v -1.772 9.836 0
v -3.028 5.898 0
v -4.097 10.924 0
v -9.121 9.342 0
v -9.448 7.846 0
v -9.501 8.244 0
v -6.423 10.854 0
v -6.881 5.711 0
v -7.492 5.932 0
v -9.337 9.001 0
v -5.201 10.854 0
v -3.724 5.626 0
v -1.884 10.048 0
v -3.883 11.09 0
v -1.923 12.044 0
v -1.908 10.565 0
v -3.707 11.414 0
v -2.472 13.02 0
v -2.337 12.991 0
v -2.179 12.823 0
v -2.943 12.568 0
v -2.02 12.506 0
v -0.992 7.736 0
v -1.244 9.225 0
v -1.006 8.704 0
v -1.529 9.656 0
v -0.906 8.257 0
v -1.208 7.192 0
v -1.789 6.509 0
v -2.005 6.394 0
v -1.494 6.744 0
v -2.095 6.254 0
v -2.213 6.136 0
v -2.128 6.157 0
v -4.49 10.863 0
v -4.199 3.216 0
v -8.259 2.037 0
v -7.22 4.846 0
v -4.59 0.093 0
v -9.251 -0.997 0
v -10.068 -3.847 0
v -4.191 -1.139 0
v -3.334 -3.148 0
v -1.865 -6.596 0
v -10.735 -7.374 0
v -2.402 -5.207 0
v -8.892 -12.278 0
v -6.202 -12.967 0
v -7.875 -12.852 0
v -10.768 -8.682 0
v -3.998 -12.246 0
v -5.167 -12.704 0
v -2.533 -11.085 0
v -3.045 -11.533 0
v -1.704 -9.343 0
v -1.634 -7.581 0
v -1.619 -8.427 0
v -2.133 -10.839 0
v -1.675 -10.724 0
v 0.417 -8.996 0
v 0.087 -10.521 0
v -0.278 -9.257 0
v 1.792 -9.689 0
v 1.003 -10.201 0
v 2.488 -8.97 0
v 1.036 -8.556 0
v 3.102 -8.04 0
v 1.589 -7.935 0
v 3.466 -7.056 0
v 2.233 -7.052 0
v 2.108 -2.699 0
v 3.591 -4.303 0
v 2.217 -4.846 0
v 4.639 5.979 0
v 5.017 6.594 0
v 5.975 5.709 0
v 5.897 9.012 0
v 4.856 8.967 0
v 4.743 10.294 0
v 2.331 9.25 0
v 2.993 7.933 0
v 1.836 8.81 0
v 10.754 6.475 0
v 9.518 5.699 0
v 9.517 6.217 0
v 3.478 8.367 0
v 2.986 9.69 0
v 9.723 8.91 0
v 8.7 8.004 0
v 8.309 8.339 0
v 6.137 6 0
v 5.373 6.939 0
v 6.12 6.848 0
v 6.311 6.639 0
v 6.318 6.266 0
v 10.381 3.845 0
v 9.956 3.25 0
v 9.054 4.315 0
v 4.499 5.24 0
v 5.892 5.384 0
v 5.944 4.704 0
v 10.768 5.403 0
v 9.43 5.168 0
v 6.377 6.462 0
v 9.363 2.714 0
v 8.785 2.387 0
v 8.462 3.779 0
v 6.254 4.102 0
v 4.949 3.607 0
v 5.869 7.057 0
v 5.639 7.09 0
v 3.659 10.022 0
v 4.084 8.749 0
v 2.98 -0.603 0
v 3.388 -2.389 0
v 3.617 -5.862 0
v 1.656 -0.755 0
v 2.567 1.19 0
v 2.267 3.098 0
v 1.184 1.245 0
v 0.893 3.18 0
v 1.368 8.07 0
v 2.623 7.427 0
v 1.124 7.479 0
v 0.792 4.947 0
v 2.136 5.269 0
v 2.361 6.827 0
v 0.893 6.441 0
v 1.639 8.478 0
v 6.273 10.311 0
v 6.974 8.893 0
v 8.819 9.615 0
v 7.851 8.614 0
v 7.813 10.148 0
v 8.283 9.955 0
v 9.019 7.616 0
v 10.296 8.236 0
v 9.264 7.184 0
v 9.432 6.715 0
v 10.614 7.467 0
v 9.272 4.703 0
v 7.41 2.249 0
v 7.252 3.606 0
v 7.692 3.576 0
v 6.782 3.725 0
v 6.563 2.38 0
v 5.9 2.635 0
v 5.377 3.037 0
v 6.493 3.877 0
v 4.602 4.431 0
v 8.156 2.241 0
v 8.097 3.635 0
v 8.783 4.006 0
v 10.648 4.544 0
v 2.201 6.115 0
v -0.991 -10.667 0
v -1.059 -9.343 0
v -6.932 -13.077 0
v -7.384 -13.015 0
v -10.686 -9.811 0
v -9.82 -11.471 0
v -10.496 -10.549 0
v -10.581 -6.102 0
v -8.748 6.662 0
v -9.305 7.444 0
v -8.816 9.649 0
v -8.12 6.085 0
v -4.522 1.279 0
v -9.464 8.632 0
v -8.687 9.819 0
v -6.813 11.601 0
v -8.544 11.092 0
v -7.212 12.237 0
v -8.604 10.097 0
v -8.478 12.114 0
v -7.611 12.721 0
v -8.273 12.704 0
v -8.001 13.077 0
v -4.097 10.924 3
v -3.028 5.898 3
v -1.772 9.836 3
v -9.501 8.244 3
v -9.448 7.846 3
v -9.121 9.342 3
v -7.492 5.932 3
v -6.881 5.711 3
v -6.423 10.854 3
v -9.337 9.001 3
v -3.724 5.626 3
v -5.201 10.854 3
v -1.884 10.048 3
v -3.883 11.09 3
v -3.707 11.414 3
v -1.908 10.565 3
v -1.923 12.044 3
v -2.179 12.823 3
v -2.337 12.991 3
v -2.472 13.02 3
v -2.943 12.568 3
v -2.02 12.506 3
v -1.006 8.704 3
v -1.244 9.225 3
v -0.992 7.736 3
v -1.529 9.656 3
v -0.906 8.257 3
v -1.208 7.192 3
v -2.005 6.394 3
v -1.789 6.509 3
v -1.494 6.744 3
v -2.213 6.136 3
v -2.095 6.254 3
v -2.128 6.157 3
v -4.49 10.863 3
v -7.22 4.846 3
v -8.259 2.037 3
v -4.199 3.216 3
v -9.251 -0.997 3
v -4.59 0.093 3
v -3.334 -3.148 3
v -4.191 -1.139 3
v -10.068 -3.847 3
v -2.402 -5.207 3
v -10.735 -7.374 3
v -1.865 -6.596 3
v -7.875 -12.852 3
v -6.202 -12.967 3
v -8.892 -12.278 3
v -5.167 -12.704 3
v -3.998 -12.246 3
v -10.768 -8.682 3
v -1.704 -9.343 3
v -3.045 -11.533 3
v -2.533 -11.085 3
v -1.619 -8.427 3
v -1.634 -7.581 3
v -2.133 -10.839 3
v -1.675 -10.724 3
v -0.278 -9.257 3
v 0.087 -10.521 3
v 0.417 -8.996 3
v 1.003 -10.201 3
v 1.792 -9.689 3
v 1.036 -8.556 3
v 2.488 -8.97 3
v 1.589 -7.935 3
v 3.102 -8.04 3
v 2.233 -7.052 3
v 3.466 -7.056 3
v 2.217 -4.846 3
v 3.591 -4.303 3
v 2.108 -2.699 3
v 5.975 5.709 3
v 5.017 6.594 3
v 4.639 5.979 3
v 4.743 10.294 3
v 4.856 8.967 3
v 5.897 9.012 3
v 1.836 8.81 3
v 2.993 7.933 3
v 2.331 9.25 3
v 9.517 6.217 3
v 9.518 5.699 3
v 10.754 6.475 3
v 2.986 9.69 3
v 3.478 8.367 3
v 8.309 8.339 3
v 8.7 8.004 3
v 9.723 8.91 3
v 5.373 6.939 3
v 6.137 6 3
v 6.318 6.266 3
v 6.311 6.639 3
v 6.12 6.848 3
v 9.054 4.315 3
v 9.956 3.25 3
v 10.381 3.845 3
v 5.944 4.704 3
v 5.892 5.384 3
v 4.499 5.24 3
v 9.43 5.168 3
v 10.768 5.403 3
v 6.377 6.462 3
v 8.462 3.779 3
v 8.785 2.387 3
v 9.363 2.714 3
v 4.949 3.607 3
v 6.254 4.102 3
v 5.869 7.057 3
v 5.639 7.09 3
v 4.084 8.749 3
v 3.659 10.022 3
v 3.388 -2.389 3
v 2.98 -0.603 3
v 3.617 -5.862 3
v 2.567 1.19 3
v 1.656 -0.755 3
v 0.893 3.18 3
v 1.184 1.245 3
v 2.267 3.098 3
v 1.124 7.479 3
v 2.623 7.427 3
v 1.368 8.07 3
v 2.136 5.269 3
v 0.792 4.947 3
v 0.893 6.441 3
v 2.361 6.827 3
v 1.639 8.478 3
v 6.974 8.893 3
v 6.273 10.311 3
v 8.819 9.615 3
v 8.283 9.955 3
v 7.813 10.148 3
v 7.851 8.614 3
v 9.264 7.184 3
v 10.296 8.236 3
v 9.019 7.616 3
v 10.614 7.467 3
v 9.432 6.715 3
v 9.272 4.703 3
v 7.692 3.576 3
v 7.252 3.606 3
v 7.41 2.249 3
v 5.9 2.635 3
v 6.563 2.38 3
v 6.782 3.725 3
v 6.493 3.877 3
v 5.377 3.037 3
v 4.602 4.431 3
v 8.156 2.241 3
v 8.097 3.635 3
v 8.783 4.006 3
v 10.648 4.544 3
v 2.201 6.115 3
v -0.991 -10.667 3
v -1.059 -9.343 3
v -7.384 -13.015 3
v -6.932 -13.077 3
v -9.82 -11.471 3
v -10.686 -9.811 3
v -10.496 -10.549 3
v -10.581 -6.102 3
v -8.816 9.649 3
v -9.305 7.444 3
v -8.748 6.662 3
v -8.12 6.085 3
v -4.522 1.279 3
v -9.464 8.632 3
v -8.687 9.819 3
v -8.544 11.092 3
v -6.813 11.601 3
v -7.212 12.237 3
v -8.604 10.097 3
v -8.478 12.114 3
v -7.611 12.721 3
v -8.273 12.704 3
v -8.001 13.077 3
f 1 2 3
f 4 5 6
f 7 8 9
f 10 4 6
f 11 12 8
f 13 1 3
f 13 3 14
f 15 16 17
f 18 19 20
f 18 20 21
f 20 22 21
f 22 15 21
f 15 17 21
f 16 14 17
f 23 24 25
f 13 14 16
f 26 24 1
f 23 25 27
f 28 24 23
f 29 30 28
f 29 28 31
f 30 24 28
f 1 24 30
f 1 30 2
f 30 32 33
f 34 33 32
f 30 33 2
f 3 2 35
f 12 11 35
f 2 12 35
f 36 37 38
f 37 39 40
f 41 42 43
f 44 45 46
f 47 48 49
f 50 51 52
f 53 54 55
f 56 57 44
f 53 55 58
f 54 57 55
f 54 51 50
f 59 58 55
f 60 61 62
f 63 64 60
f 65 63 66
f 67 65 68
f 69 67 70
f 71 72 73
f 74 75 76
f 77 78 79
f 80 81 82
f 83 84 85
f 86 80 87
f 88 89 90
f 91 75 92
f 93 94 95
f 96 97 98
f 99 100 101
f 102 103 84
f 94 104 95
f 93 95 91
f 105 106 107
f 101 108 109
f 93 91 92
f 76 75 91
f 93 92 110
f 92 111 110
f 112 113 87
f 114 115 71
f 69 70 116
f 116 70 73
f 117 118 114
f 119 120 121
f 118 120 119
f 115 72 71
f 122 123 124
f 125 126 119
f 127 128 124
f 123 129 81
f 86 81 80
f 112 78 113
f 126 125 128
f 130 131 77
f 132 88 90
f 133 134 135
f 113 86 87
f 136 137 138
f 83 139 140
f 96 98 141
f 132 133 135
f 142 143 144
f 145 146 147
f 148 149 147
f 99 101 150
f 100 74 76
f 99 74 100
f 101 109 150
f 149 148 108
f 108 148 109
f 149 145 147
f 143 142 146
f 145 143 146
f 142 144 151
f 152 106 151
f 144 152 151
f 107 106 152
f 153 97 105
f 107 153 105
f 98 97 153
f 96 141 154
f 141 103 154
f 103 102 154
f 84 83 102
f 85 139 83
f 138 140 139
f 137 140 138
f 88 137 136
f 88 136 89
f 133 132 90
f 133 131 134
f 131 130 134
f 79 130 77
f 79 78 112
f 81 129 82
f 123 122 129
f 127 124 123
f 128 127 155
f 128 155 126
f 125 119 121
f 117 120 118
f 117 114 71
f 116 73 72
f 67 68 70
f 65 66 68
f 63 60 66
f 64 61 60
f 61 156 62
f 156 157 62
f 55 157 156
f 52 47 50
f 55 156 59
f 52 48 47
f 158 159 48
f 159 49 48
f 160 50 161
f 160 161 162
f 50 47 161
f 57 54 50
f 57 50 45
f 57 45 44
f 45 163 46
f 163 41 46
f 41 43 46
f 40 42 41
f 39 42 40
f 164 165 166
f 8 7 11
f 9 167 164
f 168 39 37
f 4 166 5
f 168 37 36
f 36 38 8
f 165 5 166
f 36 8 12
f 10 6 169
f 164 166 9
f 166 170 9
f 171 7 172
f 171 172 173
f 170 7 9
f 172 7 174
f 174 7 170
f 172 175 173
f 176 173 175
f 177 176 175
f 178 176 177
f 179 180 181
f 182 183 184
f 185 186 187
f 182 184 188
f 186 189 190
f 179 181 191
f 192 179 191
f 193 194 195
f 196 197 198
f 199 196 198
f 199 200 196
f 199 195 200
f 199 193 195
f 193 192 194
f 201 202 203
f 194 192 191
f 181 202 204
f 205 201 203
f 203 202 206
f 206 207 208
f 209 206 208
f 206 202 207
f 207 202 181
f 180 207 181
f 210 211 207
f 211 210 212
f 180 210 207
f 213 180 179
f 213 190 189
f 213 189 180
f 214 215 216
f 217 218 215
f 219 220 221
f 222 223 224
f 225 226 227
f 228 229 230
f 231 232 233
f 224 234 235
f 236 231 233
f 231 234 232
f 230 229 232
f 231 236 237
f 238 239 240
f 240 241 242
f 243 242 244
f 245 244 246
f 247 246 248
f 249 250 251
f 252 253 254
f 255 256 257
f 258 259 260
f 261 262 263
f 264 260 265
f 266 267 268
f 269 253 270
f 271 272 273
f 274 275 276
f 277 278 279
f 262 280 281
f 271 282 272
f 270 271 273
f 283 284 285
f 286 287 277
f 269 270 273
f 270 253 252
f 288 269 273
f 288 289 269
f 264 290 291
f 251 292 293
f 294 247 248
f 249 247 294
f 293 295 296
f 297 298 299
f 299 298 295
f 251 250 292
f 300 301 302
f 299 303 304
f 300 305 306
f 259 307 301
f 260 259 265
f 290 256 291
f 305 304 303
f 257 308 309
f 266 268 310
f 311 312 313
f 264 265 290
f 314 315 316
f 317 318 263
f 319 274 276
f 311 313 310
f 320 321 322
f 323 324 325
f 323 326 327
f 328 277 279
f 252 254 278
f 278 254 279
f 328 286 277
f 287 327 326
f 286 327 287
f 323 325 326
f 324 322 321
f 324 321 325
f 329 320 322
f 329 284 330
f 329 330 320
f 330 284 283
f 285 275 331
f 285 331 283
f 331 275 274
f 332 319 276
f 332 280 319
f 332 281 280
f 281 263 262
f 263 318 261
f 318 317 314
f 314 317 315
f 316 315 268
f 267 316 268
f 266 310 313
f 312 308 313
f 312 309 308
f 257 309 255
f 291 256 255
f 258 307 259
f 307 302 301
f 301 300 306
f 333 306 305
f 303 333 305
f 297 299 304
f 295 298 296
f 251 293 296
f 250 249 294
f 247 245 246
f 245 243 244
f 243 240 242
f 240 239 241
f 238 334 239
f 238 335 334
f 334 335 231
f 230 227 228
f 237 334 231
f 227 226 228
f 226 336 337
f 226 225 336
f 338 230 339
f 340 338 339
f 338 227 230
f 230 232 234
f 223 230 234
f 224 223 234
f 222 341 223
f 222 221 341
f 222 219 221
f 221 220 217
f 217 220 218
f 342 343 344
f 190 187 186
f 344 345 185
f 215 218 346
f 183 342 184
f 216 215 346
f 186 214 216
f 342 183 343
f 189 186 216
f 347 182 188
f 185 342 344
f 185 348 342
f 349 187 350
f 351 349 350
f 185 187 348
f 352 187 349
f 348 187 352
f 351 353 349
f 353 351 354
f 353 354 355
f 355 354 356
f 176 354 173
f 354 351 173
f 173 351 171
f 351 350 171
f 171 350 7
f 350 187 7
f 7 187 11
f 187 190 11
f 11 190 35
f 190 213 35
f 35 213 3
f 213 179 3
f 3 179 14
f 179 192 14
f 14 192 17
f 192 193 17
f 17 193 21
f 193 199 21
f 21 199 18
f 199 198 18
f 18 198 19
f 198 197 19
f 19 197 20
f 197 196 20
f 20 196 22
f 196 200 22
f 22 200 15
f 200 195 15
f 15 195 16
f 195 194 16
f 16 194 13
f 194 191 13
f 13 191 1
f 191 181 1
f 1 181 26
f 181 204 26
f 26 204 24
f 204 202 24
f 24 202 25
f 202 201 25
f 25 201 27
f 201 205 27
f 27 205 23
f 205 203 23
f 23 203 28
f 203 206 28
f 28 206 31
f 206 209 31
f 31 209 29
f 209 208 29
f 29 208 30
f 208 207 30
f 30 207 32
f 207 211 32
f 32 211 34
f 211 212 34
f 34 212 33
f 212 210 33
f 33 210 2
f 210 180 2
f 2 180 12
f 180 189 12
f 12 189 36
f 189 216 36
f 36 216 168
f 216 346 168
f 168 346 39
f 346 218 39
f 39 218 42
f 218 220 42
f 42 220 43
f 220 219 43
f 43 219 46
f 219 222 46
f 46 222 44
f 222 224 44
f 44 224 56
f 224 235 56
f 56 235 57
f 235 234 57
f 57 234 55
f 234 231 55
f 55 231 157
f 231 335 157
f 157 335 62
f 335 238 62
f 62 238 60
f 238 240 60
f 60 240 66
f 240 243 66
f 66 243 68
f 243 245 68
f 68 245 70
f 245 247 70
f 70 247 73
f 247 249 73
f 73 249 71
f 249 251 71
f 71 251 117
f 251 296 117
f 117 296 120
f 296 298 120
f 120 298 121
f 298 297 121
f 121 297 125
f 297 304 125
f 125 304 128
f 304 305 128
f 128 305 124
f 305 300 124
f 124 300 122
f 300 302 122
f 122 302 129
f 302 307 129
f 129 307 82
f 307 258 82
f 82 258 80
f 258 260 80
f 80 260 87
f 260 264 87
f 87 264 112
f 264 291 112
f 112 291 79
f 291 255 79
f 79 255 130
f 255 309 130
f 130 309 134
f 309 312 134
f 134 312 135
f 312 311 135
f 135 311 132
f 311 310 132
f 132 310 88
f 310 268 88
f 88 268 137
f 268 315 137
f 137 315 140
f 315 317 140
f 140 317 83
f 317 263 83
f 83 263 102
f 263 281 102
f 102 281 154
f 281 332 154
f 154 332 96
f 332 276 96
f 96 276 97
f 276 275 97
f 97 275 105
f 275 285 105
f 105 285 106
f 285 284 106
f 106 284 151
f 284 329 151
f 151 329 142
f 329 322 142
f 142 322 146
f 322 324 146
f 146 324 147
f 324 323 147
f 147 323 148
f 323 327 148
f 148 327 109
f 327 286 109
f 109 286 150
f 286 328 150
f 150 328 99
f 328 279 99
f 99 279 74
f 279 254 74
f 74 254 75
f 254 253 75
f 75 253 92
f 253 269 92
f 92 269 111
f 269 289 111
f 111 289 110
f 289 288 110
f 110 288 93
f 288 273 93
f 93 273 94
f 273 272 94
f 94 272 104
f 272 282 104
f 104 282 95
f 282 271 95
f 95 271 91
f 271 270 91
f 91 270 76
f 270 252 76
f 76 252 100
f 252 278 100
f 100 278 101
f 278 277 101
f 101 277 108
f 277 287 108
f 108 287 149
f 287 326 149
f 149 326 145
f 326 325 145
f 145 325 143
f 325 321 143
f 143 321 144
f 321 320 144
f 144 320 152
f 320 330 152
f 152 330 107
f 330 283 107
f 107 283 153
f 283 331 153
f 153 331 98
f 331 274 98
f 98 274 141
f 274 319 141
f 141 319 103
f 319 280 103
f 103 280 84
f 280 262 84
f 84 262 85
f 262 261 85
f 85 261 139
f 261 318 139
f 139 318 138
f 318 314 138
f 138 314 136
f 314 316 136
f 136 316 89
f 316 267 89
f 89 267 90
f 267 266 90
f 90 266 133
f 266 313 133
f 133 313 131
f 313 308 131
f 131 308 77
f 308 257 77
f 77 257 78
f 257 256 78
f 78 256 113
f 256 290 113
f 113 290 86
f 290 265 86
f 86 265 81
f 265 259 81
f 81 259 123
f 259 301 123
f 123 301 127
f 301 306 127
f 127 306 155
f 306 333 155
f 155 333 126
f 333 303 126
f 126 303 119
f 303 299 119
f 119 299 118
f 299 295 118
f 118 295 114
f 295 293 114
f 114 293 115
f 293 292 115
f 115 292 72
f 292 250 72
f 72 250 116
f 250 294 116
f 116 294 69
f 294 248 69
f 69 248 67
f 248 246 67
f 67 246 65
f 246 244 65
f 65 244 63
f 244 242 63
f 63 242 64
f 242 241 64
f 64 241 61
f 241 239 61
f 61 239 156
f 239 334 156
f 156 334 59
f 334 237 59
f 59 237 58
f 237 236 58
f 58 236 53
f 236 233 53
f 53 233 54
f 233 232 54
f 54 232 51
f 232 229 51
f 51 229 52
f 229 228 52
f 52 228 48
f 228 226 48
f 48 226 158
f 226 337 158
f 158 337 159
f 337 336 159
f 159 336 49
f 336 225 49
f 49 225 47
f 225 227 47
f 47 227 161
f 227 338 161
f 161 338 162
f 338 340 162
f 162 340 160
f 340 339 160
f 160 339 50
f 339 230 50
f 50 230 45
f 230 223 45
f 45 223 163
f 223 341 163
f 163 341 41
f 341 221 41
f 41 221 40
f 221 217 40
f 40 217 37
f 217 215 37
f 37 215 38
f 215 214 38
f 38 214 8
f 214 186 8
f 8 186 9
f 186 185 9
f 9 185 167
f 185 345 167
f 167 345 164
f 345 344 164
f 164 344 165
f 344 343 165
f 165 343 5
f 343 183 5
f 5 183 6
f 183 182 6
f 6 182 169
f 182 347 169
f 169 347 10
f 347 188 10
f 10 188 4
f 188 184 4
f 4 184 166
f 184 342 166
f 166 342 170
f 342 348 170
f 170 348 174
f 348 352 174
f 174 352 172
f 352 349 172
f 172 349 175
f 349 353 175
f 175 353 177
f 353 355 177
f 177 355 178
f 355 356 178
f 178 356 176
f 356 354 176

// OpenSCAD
// Module names are of the form poly_<inkscape-path-id>().  As a result,
// you can associate a polygon in this OpenSCAD program with the corresponding
// SVG element in the Inkscape document by looking for the XML element with
// the attribute id="inkscape-path-id".

// fudge value is used to ensure that subtracted solids are a tad taller
// in the z dimension than the polygon being subtracted from.  This helps
// keep the resulting .stl file manifold.
fudge = 0.1;

module poly_path8(h)
{
  scale([25.4/90, -25.4/90, 1]) union()
  {
    linear_extrude(height=h)
      polygon([[-29.312300,-45.014311],[-30.041490,-42.924468],[-30.274530,-39.301072],[-30.485017,-35.775402],[-30.781956,-34.793439],[-31.236759,-34.189226],[-32.319150,-33.102959],[-33.085105,-31.892654],[-33.533919,-30.586503],[-33.664886,-29.212694],[-33.477303,-27.799419],[-32.970464,-26.374868],[-30.996202,-23.604699],[-28.771046,-21.559961],[-26.545889,-21.018706],[-24.380872,-20.236895],[-25.583660,-17.169787],[-29.262497,-7.218603],[-32.777831,3.533187],[-35.672977,13.630962],[-37.491253,21.620100],[-38.036266,26.128673],[-38.152786,30.761283],[-37.863365,34.762429],[-37.190556,37.376612],[-34.794378,40.645750],[-31.507387,43.503310],[-27.904663,45.537711],[-26.164615,46.117610],[-24.561290,46.337377],[-21.975298,45.946471],[-18.306797,45.014311],[-14.164699,43.390548],[-10.789377,40.864695],[-8.975799,39.277580],[-7.556886,38.406499],[-5.935003,37.997739],[-3.512514,37.797588],[0.308214,37.280765],[3.553860,36.143755],[6.348461,34.330178],[8.816054,31.783652],[10.991408,28.489142],[12.281585,25.002939],[12.816261,20.772511],[12.725113,15.245328],[12.003440,8.464615],[10.560096,2.134947],[9.094199,-4.217273],[8.034243,-10.975433],[7.568163,-18.671392],[7.797444,-21.667319],[8.365009,-24.191058],[9.293410,-26.314494],[10.605200,-28.109513],[12.322931,-29.648000],[14.469154,-31.001840],[17.206435,-31.772376],[20.896548,-31.934000],[24.710699,-31.509266],[27.820092,-30.520725],[29.441741,-29.547219],[30.825181,-28.359467],[31.957727,-26.985658],[32.826694,-25.453984],[33.419395,-23.792634],[33.723146,-22.029799],[33.725260,-20.193669],[33.413053,-18.312435],[32.852065,-16.664593],[32.082469,-15.289493],[31.121179,-14.194886],[29.985109,-13.388525],[28.691173,-12.878163],[27.256286,-12.671551],[25.697361,-12.776443],[24.031312,-13.200590],[23.008121,-13.736793],[22.160414,-14.535871],[21.061931,-16.666120],[20.876815,-19.078272],[21.170817,-20.229730],[21.746017,-21.259264],[22.387816,-22.202700],[22.595485,-22.898061],[22.363385,-23.525766],[21.685877,-24.266232],[20.796003,-25.004818],[19.979423,-25.123218],[19.038806,-24.587601],[17.776819,-23.364141],[16.436839,-21.185969],[15.942568,-18.568027],[16.305284,-15.702011],[17.536262,-12.779614],[19.051022,-10.759307],[20.904066,-9.336636],[23.253259,-8.432666],[26.256469,-7.968465],[28.900721,-7.939335],[31.127757,-8.457097],[33.174374,-9.617599],[35.277373,-11.516687],[36.784615,-13.623444],[37.728052,-16.102314],[38.152786,-19.144989],[38.103923,-22.943166],[37.607773,-26.457560],[36.480160,-29.182624],[34.450457,-31.569405],[31.248036,-34.068947],[29.348008,-35.274554],[27.684779,-35.955820],[22.227132,-36.534661],[16.807072,-36.474522],[12.965670,-35.512292],[10.578889,-34.335816],[8.259765,-32.775951],[6.504448,-31.216087],[5.809086,-30.039610],[4.846857,-28.596266],[3.982353,-26.498905],[3.162954,-22.822887],[2.807756,-17.527804],[3.162954,-11.268613],[4.194720,-4.411786],[5.869226,2.676202],[7.470436,9.562158],[7.853825,17.169787],[7.913964,24.987904],[5.628668,28.115151],[3.672260,30.315876],[1.479052,31.873861],[-0.984782,32.800383],[-3.753072,33.106718],[-6.038368,33.106718],[-5.737671,29.859192],[-5.790293,26.860681],[-6.609692,23.371659],[-8.511599,18.450568],[-11.811746,11.155851],[-14.848784,4.036855],[-16.262059,-0.330766],[-16.021501,-4.533004],[-14.878854,-11.396409],[-13.194951,-19.936198],[-10.729238,-20.898428],[-7.842548,-21.740379],[-7.541852,-21.815553],[-7.421573,-22.161354],[-7.105841,-22.657504],[-6.339064,-23.063445],[-5.292264,-23.895999],[-4.279291,-25.484054],[-3.514394,-27.410393],[-3.211818,-29.257799],[-3.564197,-30.842095],[-4.407087,-32.685742],[-5.419120,-34.213658],[-6.278925,-34.850759],[-6.677348,-35.602501],[-6.760040,-37.436752],[-6.812662,-42.676393],[-7.157524,-44.312372],[-7.722270,-45.435286],[-8.280438,-46.030102],[-8.759674,-46.134407],[-10.428541,-44.533196],[-13.134812,-40.443720],[-13.758758,-39.296373],[-14.518017,-38.707196],[-15.908740,-38.490130],[-18.427076,-38.459121],[-22.757110,-38.459121],[-24.140315,-41.105253],[-25.553590,-43.360479],[-26.966865,-45.074450],[-28.350070,-46.337377],[-29.312300,-45.014311]]);
  }
}

module gato2(h)
{

poly_path8(h);
}

gato2(3);
